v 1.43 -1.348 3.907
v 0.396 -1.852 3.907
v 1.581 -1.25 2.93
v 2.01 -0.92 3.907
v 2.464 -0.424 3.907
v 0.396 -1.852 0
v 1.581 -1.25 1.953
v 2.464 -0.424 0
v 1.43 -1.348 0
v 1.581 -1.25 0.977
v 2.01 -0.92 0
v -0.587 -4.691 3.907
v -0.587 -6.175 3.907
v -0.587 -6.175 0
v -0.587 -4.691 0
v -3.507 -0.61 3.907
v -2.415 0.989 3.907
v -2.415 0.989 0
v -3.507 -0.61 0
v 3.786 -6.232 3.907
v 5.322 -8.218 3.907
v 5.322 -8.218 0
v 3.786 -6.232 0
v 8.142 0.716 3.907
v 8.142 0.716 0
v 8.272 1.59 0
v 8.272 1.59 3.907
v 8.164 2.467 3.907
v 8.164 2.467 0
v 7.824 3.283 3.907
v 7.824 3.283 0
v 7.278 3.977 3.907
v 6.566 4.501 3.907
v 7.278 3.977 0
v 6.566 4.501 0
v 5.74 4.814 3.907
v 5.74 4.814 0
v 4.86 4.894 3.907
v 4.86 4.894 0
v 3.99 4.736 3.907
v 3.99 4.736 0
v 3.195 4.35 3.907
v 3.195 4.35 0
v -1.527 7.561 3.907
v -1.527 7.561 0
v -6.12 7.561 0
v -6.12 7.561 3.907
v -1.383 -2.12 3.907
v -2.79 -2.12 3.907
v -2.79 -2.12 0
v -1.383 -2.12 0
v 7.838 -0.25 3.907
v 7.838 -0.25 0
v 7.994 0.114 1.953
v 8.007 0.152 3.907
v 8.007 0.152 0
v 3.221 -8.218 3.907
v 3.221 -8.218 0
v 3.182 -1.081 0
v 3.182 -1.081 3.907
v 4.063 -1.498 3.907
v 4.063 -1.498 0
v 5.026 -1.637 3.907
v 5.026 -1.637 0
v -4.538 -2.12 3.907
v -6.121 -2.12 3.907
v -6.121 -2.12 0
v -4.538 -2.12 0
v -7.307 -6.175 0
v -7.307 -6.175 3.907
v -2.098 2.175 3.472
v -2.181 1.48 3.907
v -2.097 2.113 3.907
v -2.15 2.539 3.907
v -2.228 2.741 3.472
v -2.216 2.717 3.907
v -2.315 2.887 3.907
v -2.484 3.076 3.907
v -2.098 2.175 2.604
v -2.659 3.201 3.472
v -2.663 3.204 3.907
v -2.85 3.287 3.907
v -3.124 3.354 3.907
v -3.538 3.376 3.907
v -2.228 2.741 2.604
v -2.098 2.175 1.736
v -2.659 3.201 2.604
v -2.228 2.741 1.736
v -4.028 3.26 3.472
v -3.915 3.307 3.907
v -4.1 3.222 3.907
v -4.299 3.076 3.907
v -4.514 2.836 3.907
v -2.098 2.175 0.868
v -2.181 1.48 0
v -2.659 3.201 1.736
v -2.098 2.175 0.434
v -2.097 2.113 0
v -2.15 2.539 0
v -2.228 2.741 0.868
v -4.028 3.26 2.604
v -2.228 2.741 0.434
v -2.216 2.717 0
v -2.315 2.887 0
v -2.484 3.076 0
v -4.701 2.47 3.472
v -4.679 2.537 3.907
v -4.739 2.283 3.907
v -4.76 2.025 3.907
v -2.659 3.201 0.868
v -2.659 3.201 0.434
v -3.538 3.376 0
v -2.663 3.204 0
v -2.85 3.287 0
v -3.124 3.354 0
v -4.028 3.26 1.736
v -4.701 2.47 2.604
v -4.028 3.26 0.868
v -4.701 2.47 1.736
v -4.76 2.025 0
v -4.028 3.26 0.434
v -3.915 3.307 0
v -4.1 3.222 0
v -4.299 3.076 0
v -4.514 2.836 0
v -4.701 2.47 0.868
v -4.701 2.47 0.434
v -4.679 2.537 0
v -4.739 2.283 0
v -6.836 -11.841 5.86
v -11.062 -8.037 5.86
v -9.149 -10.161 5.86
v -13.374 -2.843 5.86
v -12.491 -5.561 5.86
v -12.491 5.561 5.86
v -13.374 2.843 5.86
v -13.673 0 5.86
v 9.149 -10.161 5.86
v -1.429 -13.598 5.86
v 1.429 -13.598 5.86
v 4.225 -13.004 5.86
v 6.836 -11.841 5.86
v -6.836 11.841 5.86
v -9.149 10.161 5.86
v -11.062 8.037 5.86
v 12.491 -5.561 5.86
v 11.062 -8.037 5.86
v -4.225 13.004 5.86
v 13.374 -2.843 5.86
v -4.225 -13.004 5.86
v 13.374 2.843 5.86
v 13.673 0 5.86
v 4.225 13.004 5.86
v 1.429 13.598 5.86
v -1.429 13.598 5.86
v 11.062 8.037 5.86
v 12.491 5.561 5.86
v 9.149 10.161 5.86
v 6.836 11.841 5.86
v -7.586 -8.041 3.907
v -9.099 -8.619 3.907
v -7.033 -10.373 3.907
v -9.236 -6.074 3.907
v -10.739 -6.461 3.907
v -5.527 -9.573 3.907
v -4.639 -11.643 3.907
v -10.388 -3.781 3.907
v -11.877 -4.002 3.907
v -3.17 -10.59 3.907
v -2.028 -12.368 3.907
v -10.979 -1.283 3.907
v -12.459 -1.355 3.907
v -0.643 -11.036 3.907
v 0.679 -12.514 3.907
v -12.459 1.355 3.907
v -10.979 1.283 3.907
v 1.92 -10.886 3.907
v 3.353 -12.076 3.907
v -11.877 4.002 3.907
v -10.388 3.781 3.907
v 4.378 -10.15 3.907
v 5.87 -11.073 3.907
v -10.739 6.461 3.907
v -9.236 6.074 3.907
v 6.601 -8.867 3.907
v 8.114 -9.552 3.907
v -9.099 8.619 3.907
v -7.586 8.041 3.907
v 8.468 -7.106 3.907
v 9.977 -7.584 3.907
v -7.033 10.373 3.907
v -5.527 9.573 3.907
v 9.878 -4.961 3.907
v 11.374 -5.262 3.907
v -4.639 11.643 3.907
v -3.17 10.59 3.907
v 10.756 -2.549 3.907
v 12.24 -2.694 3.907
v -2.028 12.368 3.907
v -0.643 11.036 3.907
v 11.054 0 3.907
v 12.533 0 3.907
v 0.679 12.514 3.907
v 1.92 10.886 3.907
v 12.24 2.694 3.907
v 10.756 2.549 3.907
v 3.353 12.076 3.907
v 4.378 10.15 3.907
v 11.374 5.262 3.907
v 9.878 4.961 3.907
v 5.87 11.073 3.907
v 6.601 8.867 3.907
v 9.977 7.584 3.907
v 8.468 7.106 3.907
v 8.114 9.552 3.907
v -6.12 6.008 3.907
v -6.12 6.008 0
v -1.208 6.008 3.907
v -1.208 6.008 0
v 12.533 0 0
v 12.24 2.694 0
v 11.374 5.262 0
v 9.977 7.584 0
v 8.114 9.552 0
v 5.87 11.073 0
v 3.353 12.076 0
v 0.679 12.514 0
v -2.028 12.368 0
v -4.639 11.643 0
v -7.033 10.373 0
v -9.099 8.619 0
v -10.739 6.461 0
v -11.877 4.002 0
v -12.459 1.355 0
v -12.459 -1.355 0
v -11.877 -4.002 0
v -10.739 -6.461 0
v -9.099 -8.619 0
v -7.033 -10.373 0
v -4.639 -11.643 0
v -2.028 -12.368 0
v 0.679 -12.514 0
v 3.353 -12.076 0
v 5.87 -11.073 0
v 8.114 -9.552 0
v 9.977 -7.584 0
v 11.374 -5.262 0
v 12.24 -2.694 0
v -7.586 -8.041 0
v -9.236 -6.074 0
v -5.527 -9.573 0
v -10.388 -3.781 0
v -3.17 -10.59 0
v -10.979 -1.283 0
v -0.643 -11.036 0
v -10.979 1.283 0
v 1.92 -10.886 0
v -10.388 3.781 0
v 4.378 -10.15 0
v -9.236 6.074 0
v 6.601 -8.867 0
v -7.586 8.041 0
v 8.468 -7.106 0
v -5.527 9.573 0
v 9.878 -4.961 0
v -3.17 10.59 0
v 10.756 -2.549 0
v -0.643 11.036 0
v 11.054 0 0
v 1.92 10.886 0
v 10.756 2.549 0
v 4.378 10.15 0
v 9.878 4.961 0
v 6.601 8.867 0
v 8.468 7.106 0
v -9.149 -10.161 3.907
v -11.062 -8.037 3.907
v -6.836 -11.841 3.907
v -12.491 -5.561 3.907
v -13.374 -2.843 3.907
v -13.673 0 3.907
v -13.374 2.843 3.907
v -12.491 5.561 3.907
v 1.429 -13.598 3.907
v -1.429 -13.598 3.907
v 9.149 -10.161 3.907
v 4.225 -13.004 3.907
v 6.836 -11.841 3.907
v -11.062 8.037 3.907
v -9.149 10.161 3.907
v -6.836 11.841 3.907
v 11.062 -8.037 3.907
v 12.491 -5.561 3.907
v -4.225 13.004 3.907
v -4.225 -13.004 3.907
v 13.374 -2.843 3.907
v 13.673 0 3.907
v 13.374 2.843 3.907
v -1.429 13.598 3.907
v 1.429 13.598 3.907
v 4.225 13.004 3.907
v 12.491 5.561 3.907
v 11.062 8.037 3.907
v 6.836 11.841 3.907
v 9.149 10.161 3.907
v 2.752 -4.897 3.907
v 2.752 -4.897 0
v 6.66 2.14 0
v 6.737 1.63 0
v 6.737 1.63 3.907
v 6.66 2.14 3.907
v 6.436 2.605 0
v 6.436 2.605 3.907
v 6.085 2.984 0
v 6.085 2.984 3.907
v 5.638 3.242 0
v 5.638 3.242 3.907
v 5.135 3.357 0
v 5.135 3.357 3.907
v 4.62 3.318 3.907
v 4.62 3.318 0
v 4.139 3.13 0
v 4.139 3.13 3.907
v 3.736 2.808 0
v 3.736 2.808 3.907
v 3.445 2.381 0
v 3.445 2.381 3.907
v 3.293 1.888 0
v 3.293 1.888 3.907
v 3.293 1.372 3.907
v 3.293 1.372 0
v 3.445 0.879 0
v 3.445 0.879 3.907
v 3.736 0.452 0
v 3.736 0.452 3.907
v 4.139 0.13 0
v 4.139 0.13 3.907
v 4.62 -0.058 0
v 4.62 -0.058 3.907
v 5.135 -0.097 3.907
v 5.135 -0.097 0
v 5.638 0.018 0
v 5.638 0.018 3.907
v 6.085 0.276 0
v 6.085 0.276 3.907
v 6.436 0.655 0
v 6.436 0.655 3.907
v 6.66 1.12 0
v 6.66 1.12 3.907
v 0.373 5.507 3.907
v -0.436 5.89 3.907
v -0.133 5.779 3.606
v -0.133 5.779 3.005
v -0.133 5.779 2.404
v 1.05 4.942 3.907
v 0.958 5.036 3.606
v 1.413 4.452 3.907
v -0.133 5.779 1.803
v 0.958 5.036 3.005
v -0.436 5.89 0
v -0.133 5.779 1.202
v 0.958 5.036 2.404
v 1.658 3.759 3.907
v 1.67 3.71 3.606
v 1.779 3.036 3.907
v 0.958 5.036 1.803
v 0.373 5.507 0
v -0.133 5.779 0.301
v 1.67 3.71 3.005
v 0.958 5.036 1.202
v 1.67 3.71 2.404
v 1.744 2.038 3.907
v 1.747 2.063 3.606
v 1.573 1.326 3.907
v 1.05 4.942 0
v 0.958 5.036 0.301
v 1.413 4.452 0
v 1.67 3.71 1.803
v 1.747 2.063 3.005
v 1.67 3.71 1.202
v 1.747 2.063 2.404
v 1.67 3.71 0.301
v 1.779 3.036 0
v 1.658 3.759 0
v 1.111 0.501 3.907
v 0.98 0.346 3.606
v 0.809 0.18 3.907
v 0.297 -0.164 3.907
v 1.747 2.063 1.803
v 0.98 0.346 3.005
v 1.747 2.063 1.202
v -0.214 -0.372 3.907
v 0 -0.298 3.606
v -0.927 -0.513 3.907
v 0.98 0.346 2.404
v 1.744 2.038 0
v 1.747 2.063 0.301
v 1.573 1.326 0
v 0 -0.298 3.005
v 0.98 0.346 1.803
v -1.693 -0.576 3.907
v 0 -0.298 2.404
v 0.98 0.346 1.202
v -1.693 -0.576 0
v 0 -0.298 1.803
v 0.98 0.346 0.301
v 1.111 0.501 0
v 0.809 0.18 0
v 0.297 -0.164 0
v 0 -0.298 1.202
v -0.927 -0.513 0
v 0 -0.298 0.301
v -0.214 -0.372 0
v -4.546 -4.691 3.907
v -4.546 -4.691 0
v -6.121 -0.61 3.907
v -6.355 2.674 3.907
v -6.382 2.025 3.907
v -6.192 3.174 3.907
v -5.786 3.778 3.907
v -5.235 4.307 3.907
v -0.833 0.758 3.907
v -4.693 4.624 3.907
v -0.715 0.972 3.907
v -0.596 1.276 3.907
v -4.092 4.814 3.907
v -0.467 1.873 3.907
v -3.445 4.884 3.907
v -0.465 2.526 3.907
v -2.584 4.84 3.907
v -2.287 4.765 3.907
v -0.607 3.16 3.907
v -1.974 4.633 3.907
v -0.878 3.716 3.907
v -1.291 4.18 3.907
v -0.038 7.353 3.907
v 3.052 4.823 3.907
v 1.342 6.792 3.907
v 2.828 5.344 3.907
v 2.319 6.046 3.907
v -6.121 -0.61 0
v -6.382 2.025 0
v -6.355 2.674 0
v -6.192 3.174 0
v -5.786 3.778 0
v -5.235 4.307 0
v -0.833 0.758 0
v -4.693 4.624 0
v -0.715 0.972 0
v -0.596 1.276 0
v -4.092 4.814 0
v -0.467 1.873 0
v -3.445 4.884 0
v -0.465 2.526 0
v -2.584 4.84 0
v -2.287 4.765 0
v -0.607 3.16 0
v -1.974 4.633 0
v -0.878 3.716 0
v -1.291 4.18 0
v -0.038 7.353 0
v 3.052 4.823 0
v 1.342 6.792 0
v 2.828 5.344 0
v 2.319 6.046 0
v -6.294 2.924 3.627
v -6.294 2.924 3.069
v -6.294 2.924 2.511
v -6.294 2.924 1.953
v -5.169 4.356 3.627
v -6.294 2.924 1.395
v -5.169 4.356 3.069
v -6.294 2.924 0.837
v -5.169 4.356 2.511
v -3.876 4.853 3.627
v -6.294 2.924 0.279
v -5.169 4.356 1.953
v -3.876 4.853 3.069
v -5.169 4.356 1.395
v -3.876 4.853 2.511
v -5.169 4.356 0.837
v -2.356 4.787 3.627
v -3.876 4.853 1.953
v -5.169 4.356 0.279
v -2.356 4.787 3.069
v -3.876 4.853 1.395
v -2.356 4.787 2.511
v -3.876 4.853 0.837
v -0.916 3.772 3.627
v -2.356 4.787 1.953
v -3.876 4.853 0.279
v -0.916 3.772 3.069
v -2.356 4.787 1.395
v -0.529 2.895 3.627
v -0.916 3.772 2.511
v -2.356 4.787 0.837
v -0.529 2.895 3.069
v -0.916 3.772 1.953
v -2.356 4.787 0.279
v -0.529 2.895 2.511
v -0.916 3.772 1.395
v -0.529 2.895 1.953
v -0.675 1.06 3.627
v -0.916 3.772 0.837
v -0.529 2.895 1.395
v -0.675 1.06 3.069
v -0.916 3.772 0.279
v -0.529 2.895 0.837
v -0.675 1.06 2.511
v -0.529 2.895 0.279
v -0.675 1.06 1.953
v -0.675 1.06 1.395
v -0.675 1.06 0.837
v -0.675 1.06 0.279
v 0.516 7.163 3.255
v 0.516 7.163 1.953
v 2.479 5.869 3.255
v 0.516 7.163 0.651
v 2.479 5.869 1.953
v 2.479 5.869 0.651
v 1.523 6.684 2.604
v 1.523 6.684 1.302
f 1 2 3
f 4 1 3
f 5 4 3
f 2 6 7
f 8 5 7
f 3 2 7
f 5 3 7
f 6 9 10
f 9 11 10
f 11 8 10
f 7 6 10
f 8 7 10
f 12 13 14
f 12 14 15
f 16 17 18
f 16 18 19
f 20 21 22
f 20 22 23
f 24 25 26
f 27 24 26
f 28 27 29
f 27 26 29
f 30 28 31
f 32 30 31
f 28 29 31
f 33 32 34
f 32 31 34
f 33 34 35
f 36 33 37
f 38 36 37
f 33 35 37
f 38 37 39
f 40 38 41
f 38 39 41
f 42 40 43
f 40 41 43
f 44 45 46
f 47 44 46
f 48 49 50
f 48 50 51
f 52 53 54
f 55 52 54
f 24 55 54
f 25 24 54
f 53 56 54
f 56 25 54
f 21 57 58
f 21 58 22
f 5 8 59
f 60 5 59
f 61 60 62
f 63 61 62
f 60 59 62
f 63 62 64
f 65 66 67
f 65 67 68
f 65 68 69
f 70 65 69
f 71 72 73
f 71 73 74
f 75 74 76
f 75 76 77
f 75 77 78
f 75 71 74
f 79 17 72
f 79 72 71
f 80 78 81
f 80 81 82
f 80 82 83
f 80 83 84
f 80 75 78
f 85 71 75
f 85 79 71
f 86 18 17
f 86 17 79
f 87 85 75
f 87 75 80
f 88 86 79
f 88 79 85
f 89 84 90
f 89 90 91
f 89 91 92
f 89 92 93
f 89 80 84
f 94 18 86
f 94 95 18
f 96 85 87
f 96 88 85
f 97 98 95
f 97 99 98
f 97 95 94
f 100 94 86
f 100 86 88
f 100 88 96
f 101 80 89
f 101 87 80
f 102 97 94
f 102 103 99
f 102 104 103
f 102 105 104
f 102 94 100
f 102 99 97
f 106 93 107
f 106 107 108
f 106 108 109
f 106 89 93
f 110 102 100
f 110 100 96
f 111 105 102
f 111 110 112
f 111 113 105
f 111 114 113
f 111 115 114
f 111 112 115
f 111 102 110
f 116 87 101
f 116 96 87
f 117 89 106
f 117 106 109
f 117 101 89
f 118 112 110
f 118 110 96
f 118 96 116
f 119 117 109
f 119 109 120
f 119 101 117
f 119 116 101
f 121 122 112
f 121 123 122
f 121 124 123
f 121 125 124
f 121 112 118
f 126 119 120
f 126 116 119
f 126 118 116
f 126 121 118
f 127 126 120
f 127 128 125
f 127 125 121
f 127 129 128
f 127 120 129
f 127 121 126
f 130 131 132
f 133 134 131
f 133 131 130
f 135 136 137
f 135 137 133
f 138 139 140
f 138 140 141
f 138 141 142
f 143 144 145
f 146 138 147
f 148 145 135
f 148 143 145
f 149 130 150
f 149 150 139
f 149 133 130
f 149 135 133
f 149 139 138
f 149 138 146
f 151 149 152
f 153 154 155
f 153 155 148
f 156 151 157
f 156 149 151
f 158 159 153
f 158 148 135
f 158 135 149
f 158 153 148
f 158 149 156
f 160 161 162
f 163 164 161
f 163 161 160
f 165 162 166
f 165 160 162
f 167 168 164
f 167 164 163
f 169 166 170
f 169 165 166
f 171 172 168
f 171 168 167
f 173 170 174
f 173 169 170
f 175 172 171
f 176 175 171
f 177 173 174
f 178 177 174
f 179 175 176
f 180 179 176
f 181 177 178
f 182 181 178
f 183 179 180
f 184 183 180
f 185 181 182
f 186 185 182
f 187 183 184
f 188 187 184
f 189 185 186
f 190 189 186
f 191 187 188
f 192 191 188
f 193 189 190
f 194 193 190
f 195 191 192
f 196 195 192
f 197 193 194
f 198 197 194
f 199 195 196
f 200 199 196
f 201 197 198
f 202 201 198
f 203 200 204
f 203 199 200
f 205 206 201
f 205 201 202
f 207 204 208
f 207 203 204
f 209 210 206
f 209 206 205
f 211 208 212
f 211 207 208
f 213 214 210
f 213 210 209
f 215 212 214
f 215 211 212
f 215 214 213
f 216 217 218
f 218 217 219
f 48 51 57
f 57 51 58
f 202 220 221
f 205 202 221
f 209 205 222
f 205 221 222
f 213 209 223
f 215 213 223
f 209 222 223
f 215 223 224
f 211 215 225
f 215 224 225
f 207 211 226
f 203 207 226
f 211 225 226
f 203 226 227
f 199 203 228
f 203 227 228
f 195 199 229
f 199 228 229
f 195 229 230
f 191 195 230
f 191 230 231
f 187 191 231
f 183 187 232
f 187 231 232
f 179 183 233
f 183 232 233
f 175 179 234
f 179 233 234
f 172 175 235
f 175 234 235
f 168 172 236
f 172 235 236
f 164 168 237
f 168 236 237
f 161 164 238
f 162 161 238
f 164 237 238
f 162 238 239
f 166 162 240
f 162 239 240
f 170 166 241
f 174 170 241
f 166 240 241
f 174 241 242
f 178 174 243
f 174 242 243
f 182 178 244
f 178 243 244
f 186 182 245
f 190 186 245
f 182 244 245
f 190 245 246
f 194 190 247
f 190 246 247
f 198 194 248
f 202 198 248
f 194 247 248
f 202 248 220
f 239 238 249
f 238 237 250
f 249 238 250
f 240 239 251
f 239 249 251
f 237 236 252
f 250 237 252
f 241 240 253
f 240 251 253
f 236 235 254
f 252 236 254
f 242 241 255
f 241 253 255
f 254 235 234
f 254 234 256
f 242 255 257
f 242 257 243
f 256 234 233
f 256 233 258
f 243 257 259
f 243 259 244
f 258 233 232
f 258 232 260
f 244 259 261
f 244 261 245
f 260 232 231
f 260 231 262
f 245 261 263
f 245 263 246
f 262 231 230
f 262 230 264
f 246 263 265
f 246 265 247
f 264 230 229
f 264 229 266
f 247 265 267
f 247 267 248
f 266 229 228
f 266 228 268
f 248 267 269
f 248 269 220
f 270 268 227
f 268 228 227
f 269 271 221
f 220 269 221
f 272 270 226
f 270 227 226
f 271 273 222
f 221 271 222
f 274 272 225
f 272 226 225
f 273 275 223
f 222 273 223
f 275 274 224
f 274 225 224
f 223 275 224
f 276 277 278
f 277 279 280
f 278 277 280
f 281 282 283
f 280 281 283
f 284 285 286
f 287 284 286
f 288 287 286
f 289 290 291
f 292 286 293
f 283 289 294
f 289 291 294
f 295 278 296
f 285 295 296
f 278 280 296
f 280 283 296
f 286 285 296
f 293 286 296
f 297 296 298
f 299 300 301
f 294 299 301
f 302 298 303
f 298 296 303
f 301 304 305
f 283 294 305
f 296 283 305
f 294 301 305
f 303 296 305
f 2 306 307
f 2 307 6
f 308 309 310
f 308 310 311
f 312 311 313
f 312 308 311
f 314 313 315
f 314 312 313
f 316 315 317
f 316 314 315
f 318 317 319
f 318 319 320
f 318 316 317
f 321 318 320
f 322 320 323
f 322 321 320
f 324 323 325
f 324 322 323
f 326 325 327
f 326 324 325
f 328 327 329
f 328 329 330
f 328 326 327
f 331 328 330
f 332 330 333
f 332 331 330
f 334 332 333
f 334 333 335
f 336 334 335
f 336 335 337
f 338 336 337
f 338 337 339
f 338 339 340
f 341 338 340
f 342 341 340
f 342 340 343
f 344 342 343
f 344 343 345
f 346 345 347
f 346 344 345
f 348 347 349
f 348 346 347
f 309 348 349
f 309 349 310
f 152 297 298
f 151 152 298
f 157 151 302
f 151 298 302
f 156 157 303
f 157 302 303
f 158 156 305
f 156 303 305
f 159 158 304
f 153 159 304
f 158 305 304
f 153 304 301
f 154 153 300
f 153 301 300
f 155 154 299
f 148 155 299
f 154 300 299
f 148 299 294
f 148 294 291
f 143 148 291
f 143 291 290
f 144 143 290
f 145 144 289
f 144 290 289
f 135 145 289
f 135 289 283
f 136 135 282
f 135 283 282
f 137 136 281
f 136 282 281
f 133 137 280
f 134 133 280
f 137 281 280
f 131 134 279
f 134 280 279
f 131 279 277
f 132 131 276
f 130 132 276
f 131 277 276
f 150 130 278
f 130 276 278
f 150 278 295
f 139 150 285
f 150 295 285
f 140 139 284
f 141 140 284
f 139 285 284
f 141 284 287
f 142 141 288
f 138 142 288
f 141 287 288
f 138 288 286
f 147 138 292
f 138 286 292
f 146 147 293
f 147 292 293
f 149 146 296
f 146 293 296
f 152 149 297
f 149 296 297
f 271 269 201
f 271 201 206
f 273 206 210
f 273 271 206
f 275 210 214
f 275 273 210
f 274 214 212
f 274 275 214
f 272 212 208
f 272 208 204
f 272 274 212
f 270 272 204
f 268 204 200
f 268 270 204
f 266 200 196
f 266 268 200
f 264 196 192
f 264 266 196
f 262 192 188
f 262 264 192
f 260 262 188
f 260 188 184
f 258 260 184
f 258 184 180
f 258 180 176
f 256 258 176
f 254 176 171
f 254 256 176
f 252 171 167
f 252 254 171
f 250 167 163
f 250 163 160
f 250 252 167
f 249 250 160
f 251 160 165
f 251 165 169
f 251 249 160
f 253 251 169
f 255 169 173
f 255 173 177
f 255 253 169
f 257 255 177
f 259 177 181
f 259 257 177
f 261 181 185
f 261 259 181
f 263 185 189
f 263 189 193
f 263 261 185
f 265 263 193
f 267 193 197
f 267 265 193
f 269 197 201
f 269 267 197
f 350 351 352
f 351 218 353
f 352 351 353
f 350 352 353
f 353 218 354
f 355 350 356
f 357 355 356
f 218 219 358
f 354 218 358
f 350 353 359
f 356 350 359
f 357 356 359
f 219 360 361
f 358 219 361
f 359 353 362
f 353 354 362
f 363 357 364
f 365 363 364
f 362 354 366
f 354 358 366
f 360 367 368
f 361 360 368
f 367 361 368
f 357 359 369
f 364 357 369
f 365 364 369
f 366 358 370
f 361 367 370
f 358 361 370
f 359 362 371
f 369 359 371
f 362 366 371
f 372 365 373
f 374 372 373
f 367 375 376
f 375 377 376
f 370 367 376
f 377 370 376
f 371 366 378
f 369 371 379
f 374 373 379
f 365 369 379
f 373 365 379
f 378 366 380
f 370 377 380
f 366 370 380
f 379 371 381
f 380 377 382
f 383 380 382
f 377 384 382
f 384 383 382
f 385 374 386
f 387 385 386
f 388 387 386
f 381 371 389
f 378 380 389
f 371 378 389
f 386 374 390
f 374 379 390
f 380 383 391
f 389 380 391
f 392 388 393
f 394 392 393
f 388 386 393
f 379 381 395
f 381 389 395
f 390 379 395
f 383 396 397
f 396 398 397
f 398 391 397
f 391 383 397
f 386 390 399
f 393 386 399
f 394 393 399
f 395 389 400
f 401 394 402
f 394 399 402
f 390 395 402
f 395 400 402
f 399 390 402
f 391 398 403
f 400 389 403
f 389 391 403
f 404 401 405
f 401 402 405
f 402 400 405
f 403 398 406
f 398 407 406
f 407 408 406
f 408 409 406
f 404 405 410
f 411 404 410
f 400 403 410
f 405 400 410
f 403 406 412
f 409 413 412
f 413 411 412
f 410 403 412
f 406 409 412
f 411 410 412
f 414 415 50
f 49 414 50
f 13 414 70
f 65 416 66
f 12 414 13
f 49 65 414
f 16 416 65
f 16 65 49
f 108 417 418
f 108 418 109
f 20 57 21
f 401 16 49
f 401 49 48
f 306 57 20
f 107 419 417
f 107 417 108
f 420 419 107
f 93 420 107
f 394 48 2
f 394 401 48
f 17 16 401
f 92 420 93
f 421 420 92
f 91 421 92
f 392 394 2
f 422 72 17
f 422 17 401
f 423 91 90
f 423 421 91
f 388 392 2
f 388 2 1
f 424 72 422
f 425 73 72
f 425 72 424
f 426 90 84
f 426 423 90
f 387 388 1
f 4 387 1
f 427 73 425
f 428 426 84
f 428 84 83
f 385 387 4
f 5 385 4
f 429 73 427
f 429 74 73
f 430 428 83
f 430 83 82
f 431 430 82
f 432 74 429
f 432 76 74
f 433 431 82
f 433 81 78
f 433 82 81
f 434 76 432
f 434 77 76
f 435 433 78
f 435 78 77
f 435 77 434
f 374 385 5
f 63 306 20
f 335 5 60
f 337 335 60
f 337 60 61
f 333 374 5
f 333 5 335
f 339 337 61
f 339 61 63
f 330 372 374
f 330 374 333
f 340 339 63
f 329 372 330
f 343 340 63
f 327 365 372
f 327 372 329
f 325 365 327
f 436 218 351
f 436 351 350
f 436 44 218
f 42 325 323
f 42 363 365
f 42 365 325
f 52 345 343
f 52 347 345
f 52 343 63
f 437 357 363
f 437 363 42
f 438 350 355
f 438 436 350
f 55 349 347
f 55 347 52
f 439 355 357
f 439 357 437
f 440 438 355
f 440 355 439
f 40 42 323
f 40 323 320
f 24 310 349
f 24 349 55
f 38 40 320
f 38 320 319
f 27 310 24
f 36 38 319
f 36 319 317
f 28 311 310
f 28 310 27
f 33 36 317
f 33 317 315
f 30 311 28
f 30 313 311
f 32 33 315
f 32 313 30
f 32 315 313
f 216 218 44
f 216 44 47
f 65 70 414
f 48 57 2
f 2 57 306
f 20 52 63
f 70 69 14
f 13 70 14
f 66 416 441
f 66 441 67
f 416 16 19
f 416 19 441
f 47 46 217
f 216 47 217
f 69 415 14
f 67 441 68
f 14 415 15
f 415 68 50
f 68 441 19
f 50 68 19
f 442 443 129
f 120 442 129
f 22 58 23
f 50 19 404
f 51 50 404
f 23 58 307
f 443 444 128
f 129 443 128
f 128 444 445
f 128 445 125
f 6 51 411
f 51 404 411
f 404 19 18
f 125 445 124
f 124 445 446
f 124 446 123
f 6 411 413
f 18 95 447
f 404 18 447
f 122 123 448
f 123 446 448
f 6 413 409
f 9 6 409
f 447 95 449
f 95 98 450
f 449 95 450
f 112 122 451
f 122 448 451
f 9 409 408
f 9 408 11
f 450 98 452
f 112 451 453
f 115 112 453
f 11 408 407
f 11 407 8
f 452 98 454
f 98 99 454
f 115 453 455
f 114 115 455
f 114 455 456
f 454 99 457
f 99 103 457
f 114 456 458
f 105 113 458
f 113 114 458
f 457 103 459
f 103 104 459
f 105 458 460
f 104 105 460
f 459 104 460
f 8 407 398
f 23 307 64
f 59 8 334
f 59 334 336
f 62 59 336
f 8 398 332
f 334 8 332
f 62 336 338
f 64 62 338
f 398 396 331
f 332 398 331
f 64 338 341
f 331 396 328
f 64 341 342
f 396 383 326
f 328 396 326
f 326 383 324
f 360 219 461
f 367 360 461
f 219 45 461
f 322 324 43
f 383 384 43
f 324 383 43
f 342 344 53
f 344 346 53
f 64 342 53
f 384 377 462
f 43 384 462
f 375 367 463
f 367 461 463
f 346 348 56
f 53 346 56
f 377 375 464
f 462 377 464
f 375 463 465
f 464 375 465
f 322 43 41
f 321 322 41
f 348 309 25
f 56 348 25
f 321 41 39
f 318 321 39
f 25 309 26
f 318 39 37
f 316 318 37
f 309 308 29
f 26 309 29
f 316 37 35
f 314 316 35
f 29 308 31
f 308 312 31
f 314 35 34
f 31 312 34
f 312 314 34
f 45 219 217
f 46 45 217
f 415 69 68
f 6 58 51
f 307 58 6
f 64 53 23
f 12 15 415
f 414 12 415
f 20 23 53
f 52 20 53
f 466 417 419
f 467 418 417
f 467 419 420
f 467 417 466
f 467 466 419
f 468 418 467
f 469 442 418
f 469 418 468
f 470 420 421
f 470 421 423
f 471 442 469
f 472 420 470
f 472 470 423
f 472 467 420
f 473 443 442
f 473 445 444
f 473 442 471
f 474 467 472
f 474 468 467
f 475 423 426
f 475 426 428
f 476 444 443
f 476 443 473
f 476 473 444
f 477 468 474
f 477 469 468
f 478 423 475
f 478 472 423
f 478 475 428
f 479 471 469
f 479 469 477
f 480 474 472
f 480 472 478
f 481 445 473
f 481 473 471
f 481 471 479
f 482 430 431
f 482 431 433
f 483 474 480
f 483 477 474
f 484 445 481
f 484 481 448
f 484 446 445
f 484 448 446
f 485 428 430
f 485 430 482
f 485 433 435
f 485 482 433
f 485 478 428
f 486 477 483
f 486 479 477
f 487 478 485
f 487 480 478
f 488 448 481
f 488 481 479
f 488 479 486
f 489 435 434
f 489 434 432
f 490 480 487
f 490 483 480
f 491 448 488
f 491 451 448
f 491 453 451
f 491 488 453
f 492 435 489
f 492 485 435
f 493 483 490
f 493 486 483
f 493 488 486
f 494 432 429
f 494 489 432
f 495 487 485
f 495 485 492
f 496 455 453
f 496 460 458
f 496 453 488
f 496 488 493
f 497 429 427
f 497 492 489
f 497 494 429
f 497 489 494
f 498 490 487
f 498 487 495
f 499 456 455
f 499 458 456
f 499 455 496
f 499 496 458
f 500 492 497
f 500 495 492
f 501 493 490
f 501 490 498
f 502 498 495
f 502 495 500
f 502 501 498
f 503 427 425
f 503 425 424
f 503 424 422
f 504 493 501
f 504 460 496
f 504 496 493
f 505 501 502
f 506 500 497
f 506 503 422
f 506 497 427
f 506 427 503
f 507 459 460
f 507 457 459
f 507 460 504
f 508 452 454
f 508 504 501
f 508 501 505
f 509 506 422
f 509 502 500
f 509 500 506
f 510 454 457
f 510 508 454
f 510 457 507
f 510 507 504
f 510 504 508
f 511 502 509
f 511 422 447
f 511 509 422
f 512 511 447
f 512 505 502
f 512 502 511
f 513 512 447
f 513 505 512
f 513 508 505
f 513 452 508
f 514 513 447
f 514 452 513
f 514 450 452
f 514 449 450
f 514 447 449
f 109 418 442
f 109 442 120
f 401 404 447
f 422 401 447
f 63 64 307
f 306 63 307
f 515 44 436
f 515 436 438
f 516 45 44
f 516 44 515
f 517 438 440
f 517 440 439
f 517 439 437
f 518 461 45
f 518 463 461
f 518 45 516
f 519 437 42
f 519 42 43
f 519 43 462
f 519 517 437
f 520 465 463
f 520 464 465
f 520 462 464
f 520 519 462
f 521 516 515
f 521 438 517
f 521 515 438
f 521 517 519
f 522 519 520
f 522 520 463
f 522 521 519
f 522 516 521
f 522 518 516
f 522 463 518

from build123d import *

# Parameters (mm, degrees)
F0_R     = 40.743575646
F0_R_2   = 35.9370755103
F1_DEPTH = 12.7
F0_R_3   = 5.6293955183
F2_R     = 44.45
F2_R_2   = 40.743575646
F2_R_3   = 35.9370755103
F3_DEPTH = 6.35
F4_SCALE = 0.3076


with BuildPart() as f1:
    # F0 (on Top) → F1 (new body)
    with BuildSketch(Plane.XY):
        Circle(F0_R)
        Circle(F0_R_2, mode=Mode.SUBTRACT)
    extrude(amount=F1_DEPTH)


with BuildPart() as f1b:
    # F0 (on Top) → F1, piece 2 (new body)
    with BuildSketch(Plane.XY):
        with BuildLine():
            Line((-19.8951568455, 24.5814528316), (-19.8951568455, 19.5323266089))
            Line((-19.8951568455, 19.5323266089), (-3.9257956669, 19.5323266089))
            add(Edge.make_bspline(
                [(-3.9257956669, 19.5323266089), (-3.438730328, 19.5104746303), (-2.3822290182, 19.4630751498), (-0.3786449133, 18.8510730848), (1.5217501862, 17.7695366524), (3.1620424026, 16.4114883974), (4.7214509943, 14.610312046), (5.4887646841, 12.0416388777), (5.9169250957, 9.5082594869), (5.7040910778, 6.649210774), (5.3912798009, 4.644006255), (3.4674883158, 0.793172229), (0.0828565548, -1.1071295737), (-2.5811872556, -1.6795230915), (-4.5175807143, -1.806500076), (-5.5046128109, -1.8712236779)],
                knots=[0, 0, 0, 0, 0.059216149, 0.1284467073, 0.1996229482, 0.2695794451, 0.3430298998, 0.4209388166, 0.4989278355, 0.5787083991, 0.6477883009, 0.7453590863, 0.8392056624, 0.918038779, 1, 1, 1, 1], degree=3))
            Line((-5.5046128109, -1.8712236779), (-2.7076895349, 2.4654201698))
            add(Edge.make_bspline(
                [(-20.7480546087, 6.5831956454), (-20.7585460718, 6.9917088112), (-20.781182378, 7.8731139097), (-20.5733666547, 9.6138395938), (-19.2712796736, 11.9639407263), (-16.8906951298, 14.2713663404), (-14.9330924971, 15.2362466845), (-12.5939575694, 15.8891147734), (-10.1593680521, 15.8892909143), (-7.5972028093, 15.7798217838), (-4.8132509192, 14.2139633666), (-2.8221318459, 12.3794947125), (-1.5126834746, 9.4308803845), (-1.3371288245, 6.0935091977), (-2.1042610126, 3.4757483807), (-2.5375457377, 2.7502941389), (-2.7076895349, 2.4654201698)],
                knots=[0, 0, 0, 0, 0.0516412436, 0.1114207795, 0.1869094046, 0.2704198006, 0.3383491951, 0.4090002294, 0.480668291, 0.5539731113, 0.6350371126, 0.7104903951, 0.7917355804, 0.8766274376, 0.9515536205, 1, 1, 1, 1], degree=3))
            Line((-20.7480546087, 6.5831956454), (-15.4742142186, 6.5831956454))
            add(Edge.make_bspline(
                [(-7.8517684109, 3.21552063), (-7.5741734312, 3.684653407), (-6.9703547629, 4.7051001235), (-6.7127666006, 7.0888011395), (-7.0842992475, 8.9693634449), (-8.5291037384, 10.6546081618), (-11.0575844103, 11.117951687), (-13.1489417529, 10.7842585024), (-14.5808251241, 9.4976987447), (-15.3938474452, 8.0727306079), (-15.4468377745, 7.065145422), (-15.4742142186, 6.5831956454)],
                knots=[0, 0, 0, 0, 0.1045393686, 0.227056894, 0.3371709022, 0.4518540569, 0.5781303241, 0.6933696298, 0.8020275151, 0.9032593864, 1, 1, 1, 1], degree=3))
            Line((-7.8517684109, 3.21552063), (-11.4010088146, -1.9821331371))
            Line((-11.4010088146, -1.9821331371), (-19.8985431343, -1.9821331371))
            Line((-19.8985431343, -1.9821331371), (-19.8985431343, -6.8908896075))
            Line((-19.8985431343, -6.8908896075), (-14.752974447, -6.8908896075))
            Line((-14.752974447, -6.8908896075), (-23.7554050982, -20.0744196773))
            Line((-23.7554050982, -20.0744196773), (-1.9094585441, -20.0744196773))
            Line((-1.9094585441, -20.0744196773), (-1.9094585441, -15.2506930754))
            Line((-1.9094585441, -15.2506930754), (-14.7799476981, -15.2506930754))
            Line((-14.7799476981, -15.2506930754), (-9.0714196651, -6.8908896075))
            Line((-9.0714196651, -6.8908896075), (-4.4958987012, -6.8908896075))
            Line((-4.4958987012, -6.8908896075), (10.4700345807, -26.71560587))
            Line((10.4700345807, -26.71560587), (17.302600693, -26.71560587))
            Line((17.302600693, -26.71560587), (12.3066055055, -20.2603686264))
            Line((12.3066055055, -20.2603686264), (25.4823547118, -0.812960615))
            add(Edge.make_bspline(
                [(25.4823547118, -0.812960615), (25.6566407717, -0.4438653858), (26.0648915746, 0.3774209025), (26.3219014686, 1.6334176353), (26.469575067, 2.3273559579)],
                knots=[0, 0, 0, 0, 0.4445123929, 1, 1, 1, 1], degree=3))
            ThreePointArc((26.469575067, 2.3273559579), (22.5605141403, 13.8593457354), (10.3872726001, 14.1417213007))
            add(Edge.make_bspline(
                [(-4.9626356922, 24.5814528316), (-3.8209935742, 24.5254755311), (-1.5444243858, 24.4138432536), (1.7289639252, 23.3115556385), (4.8284754767, 22.0137660162), (8.2467777318, 19.2932876461), (9.7929211096, 16.2944683265), (10.1999733088, 14.8076985502), (10.3872726001, 14.1417213007)],
                knots=[0, 0, 0, 0, 0.1695360722, 0.338227069, 0.5071766914, 0.6977337704, 0.8649490108, 1, 1, 1, 1], degree=3))
            Line((-4.9626356922, 24.5814528316), (-19.8951568455, 24.5814528316))
        make_face()
        with BuildLine():
            add(Edge.make_bspline(
                [(1.2859506794, -6.0207749494), (1.9026372633, -5.7643806976), (3.1816231291, -5.2478686438), (5.162946829, -4.1116478611), (6.8146264338, -2.8317200408), (7.614077877, -1.8507351717), (8.0111209502, -1.3775103922)],
                knots=[0, 0, 0, 0, 0.2484970236, 0.5115162741, 0.7626074527, 1, 1, 1, 1], degree=3))
            ThreePointArc((8.0111209502, -1.3775103922), (11.7258217447, -4.3004542916), (16.3408378537, -5.3223296982))
            Line((16.3408378537, -5.3223296982), (8.946699456, -15.9190932945))
            Line((8.946699456, -15.9190932945), (1.2859506794, -6.0207749494))
        make_face(mode=Mode.SUBTRACT)
        with Locations((16.2720531486, 5.2991794645)):
            Circle(F0_R_3, mode=Mode.SUBTRACT)
    extrude(amount=F1_DEPTH)


with BuildPart() as f3:
    # F2 (on face) → F3 (new body)
    with BuildSketch(Plane.XY.offset(12.7)):
        Circle(F2_R)
        Circle(F2_R_2, mode=Mode.SUBTRACT)
        Circle(F2_R_2)
        Circle(F2_R_3, mode=Mode.SUBTRACT)
        Circle(F2_R_3)
    extrude(amount=F3_DEPTH)


with BuildPart() as f1_1:
    # F4: moved
    add(f1.part.scale(F4_SCALE))


with BuildPart() as f1b_1:
    # F4: moved
    add(f1b.part.scale(F4_SCALE))


with BuildPart() as f3_1:
    # F4: moved
    add(f3.part.scale(F4_SCALE))


solid = Compound([f1_1.part, f1b_1.part, f3_1.part])
